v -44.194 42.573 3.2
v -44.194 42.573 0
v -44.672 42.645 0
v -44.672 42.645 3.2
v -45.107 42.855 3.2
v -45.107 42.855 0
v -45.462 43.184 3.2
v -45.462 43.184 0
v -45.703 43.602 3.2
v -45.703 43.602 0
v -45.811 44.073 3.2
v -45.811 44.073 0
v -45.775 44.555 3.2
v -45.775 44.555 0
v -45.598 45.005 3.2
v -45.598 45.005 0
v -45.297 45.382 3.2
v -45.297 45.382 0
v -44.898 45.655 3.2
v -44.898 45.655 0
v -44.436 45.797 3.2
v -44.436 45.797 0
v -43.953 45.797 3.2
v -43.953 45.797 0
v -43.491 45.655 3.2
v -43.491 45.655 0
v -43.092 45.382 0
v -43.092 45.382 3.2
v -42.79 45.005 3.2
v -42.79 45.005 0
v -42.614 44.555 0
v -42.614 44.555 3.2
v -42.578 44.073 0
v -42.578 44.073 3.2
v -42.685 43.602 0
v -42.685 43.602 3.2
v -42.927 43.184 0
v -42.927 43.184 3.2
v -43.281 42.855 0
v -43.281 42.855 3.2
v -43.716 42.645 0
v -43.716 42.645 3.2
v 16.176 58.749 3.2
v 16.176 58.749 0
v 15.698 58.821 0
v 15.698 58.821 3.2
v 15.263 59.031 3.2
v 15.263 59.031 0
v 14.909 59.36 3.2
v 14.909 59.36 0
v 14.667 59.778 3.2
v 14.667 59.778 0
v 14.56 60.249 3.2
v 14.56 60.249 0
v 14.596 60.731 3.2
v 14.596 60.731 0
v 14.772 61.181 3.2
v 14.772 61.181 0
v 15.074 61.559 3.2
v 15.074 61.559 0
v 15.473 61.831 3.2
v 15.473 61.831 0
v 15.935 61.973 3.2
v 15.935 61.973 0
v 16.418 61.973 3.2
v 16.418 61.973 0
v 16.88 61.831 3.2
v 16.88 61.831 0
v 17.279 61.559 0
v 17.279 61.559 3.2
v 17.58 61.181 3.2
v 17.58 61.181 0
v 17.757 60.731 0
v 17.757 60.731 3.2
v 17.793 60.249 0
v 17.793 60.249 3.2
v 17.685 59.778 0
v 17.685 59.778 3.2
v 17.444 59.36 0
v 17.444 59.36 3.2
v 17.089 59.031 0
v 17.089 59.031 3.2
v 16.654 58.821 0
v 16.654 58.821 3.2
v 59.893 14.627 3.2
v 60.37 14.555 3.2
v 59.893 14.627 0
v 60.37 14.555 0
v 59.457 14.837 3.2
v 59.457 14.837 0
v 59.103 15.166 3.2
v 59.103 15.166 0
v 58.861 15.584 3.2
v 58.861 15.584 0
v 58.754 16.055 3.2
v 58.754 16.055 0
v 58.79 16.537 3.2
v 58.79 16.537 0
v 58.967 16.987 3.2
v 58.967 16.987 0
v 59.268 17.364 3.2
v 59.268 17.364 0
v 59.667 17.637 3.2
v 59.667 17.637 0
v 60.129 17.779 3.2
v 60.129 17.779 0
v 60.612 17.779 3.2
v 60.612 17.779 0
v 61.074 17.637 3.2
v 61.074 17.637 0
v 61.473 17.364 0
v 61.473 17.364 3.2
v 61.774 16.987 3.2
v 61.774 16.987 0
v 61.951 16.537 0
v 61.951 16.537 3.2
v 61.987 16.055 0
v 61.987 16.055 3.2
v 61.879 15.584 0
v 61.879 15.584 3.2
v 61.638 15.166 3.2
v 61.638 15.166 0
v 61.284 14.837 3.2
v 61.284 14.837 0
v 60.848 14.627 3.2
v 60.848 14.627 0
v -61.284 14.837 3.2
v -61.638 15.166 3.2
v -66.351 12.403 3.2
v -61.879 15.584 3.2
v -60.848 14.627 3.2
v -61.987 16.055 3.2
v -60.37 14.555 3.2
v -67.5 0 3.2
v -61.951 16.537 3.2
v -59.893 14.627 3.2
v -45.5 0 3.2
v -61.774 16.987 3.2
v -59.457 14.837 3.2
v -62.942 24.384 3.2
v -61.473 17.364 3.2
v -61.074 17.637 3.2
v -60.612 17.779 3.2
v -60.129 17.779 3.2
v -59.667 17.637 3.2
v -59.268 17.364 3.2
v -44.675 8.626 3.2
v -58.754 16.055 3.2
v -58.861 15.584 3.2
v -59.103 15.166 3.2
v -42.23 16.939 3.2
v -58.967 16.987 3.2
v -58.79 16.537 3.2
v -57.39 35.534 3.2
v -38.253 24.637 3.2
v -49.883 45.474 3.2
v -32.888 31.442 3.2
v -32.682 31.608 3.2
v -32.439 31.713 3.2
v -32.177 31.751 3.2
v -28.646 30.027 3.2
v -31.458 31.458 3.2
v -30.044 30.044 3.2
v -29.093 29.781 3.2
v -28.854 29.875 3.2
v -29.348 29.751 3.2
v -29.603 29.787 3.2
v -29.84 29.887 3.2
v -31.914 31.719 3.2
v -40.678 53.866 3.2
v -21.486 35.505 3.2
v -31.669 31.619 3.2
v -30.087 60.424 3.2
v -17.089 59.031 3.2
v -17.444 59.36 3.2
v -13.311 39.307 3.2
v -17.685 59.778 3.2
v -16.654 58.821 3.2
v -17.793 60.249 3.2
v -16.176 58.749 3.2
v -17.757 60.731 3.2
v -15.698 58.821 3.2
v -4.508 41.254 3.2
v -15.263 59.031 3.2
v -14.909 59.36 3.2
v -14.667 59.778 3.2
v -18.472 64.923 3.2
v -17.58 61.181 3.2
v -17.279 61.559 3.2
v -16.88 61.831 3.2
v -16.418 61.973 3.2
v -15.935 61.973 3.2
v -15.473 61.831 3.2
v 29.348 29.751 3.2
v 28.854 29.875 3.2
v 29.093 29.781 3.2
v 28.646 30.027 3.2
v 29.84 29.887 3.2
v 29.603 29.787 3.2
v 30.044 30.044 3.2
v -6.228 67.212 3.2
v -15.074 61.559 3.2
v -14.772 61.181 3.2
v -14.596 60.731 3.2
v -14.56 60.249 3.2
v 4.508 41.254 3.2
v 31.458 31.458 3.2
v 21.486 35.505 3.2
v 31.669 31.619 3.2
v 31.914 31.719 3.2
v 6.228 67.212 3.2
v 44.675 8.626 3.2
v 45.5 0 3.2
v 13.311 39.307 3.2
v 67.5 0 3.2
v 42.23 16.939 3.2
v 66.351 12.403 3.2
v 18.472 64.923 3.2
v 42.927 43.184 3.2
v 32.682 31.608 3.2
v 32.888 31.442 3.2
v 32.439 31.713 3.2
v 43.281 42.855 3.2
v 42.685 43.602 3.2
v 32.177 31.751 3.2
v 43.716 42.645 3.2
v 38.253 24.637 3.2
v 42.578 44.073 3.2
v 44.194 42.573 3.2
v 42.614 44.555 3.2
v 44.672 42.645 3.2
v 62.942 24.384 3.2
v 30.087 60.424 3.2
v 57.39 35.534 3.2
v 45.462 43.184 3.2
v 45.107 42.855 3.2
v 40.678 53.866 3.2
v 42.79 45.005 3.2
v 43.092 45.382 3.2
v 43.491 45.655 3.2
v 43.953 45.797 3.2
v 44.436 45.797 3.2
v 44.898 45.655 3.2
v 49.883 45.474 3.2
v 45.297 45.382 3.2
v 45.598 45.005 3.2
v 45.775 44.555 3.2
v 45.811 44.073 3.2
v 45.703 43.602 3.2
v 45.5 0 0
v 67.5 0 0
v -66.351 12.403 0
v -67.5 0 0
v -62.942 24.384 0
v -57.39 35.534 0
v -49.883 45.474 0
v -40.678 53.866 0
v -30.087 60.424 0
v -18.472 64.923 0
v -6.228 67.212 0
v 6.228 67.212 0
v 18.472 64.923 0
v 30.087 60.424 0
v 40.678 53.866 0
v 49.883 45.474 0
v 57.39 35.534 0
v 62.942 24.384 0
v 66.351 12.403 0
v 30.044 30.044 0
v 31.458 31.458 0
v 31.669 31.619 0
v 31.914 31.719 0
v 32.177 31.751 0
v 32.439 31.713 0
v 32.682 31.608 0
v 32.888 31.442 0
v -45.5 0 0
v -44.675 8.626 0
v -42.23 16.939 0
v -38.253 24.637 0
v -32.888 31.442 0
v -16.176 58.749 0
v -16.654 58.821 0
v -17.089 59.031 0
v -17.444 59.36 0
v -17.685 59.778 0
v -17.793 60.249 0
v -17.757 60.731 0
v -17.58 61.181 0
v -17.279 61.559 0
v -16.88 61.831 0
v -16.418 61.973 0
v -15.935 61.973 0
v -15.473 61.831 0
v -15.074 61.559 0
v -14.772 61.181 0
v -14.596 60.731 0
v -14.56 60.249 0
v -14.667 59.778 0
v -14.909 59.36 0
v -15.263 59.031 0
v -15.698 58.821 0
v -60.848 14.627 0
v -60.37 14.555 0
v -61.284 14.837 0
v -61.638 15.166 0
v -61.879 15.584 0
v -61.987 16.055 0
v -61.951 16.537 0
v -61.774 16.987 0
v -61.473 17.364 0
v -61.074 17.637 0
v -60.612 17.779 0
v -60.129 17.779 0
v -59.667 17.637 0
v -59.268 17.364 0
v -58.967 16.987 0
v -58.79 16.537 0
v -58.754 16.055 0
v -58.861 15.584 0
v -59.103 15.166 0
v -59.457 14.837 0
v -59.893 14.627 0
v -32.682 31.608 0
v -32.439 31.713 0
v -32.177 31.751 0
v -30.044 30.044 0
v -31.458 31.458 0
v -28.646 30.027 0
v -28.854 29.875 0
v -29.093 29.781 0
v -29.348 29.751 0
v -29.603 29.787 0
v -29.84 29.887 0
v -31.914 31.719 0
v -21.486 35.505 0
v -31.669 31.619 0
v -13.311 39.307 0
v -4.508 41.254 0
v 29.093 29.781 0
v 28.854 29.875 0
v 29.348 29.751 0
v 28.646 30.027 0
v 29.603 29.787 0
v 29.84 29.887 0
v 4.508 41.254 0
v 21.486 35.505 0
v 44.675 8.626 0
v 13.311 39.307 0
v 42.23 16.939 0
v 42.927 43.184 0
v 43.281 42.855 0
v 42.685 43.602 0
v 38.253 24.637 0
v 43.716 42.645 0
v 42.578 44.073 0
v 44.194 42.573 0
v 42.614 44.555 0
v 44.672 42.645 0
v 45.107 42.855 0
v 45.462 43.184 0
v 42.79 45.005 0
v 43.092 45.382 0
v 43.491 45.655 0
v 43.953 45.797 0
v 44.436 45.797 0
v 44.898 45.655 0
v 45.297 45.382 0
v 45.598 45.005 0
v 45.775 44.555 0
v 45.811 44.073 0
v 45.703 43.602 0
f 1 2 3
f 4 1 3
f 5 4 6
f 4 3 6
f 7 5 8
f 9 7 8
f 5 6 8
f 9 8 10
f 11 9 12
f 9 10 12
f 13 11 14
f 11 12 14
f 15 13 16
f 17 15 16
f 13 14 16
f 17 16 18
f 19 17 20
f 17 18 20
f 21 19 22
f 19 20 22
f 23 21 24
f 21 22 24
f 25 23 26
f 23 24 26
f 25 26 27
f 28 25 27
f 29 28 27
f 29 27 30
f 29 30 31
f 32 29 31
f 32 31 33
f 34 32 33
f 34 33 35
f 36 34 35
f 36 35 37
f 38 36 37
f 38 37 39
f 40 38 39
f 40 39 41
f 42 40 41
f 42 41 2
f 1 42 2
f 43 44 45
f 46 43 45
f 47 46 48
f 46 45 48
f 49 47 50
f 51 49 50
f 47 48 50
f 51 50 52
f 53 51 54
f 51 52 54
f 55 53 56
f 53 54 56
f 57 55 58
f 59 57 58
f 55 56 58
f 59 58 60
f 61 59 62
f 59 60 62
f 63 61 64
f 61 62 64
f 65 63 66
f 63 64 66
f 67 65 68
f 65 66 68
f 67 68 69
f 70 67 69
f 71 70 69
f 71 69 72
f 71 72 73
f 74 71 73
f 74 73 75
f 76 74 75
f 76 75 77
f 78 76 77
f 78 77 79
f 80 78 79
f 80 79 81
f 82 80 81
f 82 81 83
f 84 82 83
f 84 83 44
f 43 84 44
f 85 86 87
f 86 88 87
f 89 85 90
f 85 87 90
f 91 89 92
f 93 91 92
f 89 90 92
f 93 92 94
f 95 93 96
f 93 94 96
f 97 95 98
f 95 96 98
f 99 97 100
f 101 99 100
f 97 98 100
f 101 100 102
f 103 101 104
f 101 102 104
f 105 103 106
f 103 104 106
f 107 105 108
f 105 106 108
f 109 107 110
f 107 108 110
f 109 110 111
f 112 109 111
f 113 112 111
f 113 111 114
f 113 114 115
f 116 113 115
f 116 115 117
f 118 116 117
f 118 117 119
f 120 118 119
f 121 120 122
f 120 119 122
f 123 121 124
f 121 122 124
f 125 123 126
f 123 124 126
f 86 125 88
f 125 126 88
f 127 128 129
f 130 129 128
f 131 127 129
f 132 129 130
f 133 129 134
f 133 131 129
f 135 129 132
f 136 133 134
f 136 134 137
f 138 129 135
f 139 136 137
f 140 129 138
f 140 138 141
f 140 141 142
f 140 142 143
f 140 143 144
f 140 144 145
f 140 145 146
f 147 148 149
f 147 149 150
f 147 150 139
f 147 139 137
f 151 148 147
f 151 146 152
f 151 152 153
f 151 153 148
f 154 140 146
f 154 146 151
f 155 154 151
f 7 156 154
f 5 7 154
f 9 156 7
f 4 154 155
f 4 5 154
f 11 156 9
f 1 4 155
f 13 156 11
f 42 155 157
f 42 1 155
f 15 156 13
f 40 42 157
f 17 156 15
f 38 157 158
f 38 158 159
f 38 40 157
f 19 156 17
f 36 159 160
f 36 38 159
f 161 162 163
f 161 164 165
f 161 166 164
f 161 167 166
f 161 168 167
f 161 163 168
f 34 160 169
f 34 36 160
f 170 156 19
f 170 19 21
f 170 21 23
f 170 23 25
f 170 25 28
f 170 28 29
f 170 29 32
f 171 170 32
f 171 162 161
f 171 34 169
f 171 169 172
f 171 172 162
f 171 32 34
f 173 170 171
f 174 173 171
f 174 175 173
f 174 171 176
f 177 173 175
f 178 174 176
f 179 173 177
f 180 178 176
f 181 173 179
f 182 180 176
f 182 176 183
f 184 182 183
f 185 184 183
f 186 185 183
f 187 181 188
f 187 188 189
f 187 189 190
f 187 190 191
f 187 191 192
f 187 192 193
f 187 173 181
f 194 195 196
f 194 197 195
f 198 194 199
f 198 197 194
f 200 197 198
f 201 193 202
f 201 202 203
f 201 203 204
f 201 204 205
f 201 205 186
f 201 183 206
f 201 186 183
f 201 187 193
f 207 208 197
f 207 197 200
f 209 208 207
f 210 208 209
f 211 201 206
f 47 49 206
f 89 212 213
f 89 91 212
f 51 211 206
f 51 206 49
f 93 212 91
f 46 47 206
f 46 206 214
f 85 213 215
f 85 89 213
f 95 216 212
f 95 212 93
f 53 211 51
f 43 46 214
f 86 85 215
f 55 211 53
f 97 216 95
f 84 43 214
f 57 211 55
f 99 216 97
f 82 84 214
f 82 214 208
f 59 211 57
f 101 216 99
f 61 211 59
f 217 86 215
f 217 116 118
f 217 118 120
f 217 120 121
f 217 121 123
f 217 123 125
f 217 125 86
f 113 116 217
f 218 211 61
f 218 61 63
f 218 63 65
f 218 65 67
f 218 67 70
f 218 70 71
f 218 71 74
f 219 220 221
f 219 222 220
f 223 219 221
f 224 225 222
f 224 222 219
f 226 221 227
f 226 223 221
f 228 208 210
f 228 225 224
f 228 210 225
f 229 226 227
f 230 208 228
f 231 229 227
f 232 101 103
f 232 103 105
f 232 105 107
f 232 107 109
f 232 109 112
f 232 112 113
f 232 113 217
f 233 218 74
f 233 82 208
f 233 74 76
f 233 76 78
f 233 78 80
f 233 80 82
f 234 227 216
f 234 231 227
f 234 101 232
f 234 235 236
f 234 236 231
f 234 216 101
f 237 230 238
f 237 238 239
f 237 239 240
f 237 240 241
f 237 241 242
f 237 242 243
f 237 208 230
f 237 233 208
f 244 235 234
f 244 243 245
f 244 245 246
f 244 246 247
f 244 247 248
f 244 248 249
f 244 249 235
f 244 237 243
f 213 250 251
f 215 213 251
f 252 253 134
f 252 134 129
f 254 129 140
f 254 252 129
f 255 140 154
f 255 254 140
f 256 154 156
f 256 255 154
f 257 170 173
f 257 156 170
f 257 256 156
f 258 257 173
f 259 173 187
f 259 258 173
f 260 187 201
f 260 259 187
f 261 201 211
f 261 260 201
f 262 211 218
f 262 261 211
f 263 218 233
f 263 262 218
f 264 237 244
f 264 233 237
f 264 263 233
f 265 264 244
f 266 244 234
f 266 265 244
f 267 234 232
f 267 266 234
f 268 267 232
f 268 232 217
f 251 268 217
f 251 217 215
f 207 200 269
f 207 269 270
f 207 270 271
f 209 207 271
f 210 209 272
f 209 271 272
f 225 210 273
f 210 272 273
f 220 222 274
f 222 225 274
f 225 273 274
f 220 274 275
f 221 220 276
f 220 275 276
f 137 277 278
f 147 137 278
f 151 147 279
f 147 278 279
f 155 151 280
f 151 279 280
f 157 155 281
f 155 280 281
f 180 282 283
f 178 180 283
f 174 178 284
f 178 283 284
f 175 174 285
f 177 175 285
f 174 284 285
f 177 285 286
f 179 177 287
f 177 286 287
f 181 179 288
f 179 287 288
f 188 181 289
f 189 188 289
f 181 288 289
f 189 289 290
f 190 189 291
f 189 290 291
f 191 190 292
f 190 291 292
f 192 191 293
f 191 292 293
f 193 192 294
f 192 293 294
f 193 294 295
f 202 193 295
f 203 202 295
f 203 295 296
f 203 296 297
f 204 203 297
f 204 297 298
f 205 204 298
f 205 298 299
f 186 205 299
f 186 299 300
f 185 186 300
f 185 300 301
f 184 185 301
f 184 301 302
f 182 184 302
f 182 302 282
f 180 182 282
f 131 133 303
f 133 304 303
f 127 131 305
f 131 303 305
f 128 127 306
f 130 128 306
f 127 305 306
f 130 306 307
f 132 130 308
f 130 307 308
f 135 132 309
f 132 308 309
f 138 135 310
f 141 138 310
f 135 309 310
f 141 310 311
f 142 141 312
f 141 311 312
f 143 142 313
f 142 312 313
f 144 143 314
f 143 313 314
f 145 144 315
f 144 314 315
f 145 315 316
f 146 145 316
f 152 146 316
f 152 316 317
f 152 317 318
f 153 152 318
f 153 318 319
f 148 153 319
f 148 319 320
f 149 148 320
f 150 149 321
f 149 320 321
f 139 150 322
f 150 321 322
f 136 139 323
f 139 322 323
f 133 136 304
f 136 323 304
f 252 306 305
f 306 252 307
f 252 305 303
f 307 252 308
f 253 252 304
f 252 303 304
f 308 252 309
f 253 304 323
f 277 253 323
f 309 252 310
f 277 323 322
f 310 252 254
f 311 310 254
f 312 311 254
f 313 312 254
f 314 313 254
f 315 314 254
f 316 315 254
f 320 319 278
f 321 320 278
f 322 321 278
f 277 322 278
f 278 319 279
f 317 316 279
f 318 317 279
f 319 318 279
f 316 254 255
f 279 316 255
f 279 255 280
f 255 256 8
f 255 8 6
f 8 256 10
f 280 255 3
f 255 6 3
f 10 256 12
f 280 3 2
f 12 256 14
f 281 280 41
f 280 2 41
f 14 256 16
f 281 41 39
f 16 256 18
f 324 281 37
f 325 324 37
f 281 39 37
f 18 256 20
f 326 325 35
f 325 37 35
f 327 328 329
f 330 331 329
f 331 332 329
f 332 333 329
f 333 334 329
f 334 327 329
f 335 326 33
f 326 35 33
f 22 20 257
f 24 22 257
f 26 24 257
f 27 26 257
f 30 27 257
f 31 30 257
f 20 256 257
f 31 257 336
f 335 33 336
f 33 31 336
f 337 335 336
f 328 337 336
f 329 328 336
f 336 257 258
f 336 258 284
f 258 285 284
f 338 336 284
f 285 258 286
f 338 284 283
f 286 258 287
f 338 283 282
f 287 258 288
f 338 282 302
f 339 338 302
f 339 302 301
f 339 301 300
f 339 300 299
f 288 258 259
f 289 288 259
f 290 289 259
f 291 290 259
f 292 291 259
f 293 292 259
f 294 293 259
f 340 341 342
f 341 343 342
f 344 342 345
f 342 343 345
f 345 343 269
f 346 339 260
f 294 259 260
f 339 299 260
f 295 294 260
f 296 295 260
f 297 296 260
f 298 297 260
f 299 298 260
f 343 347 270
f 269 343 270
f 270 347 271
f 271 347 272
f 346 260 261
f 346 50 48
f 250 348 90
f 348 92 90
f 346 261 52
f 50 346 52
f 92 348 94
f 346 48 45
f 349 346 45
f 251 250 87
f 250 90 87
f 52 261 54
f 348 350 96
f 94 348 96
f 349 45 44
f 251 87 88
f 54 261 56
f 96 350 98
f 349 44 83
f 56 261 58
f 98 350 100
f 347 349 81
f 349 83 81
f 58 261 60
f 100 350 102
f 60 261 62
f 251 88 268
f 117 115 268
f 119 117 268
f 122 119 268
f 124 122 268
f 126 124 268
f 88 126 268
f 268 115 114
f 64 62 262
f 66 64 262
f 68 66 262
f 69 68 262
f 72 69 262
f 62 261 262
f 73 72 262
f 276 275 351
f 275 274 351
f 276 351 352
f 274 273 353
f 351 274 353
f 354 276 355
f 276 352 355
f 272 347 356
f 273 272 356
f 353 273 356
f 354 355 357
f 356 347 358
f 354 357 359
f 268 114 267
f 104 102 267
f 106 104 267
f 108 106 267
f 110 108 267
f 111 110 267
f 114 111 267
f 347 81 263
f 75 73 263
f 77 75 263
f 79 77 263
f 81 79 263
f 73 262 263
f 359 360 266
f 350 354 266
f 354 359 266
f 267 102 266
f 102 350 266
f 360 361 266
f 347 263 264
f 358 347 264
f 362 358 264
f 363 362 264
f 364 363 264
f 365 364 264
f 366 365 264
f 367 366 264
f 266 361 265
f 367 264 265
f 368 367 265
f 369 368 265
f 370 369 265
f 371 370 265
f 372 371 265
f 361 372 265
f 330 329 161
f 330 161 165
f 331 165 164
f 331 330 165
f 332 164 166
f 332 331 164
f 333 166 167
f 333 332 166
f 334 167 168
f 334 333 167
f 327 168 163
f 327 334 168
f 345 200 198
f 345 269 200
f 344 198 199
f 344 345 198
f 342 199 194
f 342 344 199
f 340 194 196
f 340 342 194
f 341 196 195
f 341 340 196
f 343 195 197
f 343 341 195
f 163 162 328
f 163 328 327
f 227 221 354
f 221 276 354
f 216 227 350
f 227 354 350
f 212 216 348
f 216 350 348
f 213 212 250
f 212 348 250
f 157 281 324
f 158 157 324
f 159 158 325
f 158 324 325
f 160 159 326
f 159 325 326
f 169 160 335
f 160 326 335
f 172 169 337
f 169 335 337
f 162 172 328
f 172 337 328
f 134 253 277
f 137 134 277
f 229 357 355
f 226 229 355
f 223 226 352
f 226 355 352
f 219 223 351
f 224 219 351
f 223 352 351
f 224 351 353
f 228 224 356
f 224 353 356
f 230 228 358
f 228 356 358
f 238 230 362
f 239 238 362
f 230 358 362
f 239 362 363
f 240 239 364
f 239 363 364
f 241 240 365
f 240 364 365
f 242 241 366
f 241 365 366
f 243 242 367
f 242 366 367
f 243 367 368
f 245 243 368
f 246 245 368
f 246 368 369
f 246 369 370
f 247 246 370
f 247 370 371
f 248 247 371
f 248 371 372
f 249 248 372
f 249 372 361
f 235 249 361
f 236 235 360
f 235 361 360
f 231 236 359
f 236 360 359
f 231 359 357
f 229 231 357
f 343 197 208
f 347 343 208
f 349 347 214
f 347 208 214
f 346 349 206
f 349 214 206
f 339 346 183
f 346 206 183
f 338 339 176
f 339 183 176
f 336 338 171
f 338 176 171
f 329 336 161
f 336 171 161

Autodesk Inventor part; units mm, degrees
ref_plane "YZ Plane" through (0, 0, 0) normal (1, 0, 0) x (0, 1, 0)
ref_plane "XZ Plane" through (0, 0, 0) normal (0, 1, 0) x (-1, 0, 0)
ref_plane "XY Plane" through (0, 0, 0) normal (0, 0, 1) x (1, 0, 0)
sketch "スケッチ5" plane through (0, 0, 3.2) normal (0, 0, 1) x (1, 0, 0)
  circle A0 centre (-16.1762, 60.3704) radius 1.621 projected
  circle A1 centre (16.1762, 60.3704) radius 1.621 projected
  arc A2 (67.5, 0) -> (-67.5, 0) centre (0, 0) ccw projected
  circle A3 centre (-16.1762, 60.3704) radius 5
  circle A4 centre (16.1762, 60.3704) radius 5
  circle A5 centre (-44.1942, 44.1942) radius 1.621 projected
  circle A6 centre (-60.3704, 16.1762) radius 1.621 projected
  circle A7 centre (44.1942, 44.1942) radius 1.621 projected
  circle A8 centre (60.3704, 16.1762) radius 1.621 projected
  arc A9 (62.5, 0) -> (-62.5, 0) centre (0, 0) ccw
  circle A10 centre (-44.1942, 44.1942) radius 5
  circle A11 centre (-60.3704, 16.1762) radius 5
  circle A12 centre (44.1942, 44.1942) radius 5
  circle A13 centre (60.3704, 16.1762) radius 5
  line L0 (-45.5, 0) -> (-67.5, 0) projected
  line L1 (67.5, 0) -> (45.5, 0) projected
  point P0 (17.4703, 65.2)
  point P1 (-17.4703, 65.2)
  point P2 (58.8841, 20.9502)
  point P3 (65.2, 17.4703)
  point P4 (47.7297, 47.7297)
  point P5 (47.5855, 40.52)
  point P6 (40.52, 47.5855)
  point P7 (20.9502, 58.8841)
  point P8 (-65.2, 17.4703)
  point P9 (-58.8841, 20.9502)
  point P10 (-47.5855, 40.52)
  point P11 (-47.7297, 47.7297)
  point P12 (-40.52, 47.5855)
  point P13 (-20.9502, 58.8841)
  point P14 (-11.2987, 61.4702)
  point P15 (11.2987, 61.4702)
  point P16 (61.4702, 11.2987)
  point P17 (-61.4702, 11.2987)
sketch "スケッチ1" plane through (0, 0, 0) normal (0, 0, 1) x (1, 0, 0)
  arc A0 (45.5, 0) -> (-45.5, 0) centre (0, 0) ccw
  arc A1 (67.5, 0) -> (-67.5, 0) centre (0, 0) ccw
  line L0 (-44.5, 0) -> (0, 0)
  line L1 (-67.5, 0) -> (67.5, 0)
  dimension "d0" = 91
  dimension "d1" = 135
  dimension "d5" = 0
extrude "プレート2" add sketch "スケッチ1" along normal blind 3.2 contours A0 L1 A1
sketch "スケッチ2" plane through (0, 0, 3.2) normal (0, 0, 1) x (1, 0, 0)
  circle A0 centre (0, 0) radius 62.5
  point P0 (16.1762, 60.3704)
  point P1 (-16.1762, 60.3704)
  point P2 (-44.1942, 44.1942)
  point P3 (-60.3704, 16.1762)
  point P4 (-60.3704, -16.1762)
  point P5 (-44.1942, -44.1942)
  point P6 (-16.1762, -60.3704)
  point P7 (16.1762, -60.3704)
  point P8 (44.1942, -44.1942)
  point P9 (60.3704, -16.1762)
  point P10 (60.3704, 16.1762)
  point P11 (44.1942, 44.1942)
  dimension "d8" = 125
  dimension "d11" = 360
  dimension "d49" = 0
hole "穴1" at (16.1762, 60.3704, 3.2) at (-16.1762, 60.3704, 3.2) at (-44.1942, 44.1942, 3.2) at (-60.3704, 16.1762, 3.2) at (-60.3704, -16.1762, 3.2) at (-44.1942, -44.1942, 3.2) at (-16.1762, -60.3704, 3.2) at (16.1762, -60.3704, 3.2) at (44.1942, -44.1942, 3.2) at (60.3704, -16.1762, 3.2) at (60.3704, 16.1762, 3.2) at (44.1942, 44.1942, 3.2) direction (0, 0, -1) diameter 3.242 end through all thread size "M4x0.7" class "6H" standard "ANSI Metric M Profile"
sketch "スケッチ6" plane through (0, 0, 3.2) normal (0, 0, 1) x (1, 0, 0)
  arc A0 (45.5, 0) -> (-45.5, 0) centre (0, 0) ccw projected
  line L0 (-32.1734, 32.1734) -> (0, 0)
  line L1 (0, 0) -> (32.1734, 32.1734)
  line L2 (0, 81) -> (0, -13.5) projected
  arc A1 (41.5, 0) -> (-41.5, 0) centre (0, 0) ccw
  point P0 (-29.3449, 29.3449)
  point P1 (29.3449, 29.3449)
  dimension "d50" = 45
  dimension "d51" = 45
  dimension "d56" = 4
extrude "押し出し2" add sketch "スケッチ6" against normal up to surface (3.2 mm away) contours L1 A1 L2 A0 | L2 A1 L0 A0
fillet "コーナーR7" radius 1 4 edges at (-29.3449, 29.3449, 1.6) (29.3449, 29.3449, 1.6) (-32.1734, 32.1734, 1.6) (32.1734, 32.1734, 1.6)
equation "\"d18\" = Thickness"
equation "\"d6\" = Thickness"
equation "\"BendRadius\" = Thickness"
equation "\"BendReliefWidth\" = Thickness"
equation "\"BendReliefDepth\" = 0.5 * Thickness"
equation "\"CornerReliefSize\" = 4 * Thickness"
equation "\"MinimumRemnant\" = 2 * Thickness"
equation "\"TransitionRadius\" = BendRadius"
equation "\"JacobiRadiusSize\" = BendRadius"
equation "\"GapSize\" = Thickness"
equation "\"Thickness\" = 3.2"
properties part number "plate1" material "鋼、炭素鋼"
